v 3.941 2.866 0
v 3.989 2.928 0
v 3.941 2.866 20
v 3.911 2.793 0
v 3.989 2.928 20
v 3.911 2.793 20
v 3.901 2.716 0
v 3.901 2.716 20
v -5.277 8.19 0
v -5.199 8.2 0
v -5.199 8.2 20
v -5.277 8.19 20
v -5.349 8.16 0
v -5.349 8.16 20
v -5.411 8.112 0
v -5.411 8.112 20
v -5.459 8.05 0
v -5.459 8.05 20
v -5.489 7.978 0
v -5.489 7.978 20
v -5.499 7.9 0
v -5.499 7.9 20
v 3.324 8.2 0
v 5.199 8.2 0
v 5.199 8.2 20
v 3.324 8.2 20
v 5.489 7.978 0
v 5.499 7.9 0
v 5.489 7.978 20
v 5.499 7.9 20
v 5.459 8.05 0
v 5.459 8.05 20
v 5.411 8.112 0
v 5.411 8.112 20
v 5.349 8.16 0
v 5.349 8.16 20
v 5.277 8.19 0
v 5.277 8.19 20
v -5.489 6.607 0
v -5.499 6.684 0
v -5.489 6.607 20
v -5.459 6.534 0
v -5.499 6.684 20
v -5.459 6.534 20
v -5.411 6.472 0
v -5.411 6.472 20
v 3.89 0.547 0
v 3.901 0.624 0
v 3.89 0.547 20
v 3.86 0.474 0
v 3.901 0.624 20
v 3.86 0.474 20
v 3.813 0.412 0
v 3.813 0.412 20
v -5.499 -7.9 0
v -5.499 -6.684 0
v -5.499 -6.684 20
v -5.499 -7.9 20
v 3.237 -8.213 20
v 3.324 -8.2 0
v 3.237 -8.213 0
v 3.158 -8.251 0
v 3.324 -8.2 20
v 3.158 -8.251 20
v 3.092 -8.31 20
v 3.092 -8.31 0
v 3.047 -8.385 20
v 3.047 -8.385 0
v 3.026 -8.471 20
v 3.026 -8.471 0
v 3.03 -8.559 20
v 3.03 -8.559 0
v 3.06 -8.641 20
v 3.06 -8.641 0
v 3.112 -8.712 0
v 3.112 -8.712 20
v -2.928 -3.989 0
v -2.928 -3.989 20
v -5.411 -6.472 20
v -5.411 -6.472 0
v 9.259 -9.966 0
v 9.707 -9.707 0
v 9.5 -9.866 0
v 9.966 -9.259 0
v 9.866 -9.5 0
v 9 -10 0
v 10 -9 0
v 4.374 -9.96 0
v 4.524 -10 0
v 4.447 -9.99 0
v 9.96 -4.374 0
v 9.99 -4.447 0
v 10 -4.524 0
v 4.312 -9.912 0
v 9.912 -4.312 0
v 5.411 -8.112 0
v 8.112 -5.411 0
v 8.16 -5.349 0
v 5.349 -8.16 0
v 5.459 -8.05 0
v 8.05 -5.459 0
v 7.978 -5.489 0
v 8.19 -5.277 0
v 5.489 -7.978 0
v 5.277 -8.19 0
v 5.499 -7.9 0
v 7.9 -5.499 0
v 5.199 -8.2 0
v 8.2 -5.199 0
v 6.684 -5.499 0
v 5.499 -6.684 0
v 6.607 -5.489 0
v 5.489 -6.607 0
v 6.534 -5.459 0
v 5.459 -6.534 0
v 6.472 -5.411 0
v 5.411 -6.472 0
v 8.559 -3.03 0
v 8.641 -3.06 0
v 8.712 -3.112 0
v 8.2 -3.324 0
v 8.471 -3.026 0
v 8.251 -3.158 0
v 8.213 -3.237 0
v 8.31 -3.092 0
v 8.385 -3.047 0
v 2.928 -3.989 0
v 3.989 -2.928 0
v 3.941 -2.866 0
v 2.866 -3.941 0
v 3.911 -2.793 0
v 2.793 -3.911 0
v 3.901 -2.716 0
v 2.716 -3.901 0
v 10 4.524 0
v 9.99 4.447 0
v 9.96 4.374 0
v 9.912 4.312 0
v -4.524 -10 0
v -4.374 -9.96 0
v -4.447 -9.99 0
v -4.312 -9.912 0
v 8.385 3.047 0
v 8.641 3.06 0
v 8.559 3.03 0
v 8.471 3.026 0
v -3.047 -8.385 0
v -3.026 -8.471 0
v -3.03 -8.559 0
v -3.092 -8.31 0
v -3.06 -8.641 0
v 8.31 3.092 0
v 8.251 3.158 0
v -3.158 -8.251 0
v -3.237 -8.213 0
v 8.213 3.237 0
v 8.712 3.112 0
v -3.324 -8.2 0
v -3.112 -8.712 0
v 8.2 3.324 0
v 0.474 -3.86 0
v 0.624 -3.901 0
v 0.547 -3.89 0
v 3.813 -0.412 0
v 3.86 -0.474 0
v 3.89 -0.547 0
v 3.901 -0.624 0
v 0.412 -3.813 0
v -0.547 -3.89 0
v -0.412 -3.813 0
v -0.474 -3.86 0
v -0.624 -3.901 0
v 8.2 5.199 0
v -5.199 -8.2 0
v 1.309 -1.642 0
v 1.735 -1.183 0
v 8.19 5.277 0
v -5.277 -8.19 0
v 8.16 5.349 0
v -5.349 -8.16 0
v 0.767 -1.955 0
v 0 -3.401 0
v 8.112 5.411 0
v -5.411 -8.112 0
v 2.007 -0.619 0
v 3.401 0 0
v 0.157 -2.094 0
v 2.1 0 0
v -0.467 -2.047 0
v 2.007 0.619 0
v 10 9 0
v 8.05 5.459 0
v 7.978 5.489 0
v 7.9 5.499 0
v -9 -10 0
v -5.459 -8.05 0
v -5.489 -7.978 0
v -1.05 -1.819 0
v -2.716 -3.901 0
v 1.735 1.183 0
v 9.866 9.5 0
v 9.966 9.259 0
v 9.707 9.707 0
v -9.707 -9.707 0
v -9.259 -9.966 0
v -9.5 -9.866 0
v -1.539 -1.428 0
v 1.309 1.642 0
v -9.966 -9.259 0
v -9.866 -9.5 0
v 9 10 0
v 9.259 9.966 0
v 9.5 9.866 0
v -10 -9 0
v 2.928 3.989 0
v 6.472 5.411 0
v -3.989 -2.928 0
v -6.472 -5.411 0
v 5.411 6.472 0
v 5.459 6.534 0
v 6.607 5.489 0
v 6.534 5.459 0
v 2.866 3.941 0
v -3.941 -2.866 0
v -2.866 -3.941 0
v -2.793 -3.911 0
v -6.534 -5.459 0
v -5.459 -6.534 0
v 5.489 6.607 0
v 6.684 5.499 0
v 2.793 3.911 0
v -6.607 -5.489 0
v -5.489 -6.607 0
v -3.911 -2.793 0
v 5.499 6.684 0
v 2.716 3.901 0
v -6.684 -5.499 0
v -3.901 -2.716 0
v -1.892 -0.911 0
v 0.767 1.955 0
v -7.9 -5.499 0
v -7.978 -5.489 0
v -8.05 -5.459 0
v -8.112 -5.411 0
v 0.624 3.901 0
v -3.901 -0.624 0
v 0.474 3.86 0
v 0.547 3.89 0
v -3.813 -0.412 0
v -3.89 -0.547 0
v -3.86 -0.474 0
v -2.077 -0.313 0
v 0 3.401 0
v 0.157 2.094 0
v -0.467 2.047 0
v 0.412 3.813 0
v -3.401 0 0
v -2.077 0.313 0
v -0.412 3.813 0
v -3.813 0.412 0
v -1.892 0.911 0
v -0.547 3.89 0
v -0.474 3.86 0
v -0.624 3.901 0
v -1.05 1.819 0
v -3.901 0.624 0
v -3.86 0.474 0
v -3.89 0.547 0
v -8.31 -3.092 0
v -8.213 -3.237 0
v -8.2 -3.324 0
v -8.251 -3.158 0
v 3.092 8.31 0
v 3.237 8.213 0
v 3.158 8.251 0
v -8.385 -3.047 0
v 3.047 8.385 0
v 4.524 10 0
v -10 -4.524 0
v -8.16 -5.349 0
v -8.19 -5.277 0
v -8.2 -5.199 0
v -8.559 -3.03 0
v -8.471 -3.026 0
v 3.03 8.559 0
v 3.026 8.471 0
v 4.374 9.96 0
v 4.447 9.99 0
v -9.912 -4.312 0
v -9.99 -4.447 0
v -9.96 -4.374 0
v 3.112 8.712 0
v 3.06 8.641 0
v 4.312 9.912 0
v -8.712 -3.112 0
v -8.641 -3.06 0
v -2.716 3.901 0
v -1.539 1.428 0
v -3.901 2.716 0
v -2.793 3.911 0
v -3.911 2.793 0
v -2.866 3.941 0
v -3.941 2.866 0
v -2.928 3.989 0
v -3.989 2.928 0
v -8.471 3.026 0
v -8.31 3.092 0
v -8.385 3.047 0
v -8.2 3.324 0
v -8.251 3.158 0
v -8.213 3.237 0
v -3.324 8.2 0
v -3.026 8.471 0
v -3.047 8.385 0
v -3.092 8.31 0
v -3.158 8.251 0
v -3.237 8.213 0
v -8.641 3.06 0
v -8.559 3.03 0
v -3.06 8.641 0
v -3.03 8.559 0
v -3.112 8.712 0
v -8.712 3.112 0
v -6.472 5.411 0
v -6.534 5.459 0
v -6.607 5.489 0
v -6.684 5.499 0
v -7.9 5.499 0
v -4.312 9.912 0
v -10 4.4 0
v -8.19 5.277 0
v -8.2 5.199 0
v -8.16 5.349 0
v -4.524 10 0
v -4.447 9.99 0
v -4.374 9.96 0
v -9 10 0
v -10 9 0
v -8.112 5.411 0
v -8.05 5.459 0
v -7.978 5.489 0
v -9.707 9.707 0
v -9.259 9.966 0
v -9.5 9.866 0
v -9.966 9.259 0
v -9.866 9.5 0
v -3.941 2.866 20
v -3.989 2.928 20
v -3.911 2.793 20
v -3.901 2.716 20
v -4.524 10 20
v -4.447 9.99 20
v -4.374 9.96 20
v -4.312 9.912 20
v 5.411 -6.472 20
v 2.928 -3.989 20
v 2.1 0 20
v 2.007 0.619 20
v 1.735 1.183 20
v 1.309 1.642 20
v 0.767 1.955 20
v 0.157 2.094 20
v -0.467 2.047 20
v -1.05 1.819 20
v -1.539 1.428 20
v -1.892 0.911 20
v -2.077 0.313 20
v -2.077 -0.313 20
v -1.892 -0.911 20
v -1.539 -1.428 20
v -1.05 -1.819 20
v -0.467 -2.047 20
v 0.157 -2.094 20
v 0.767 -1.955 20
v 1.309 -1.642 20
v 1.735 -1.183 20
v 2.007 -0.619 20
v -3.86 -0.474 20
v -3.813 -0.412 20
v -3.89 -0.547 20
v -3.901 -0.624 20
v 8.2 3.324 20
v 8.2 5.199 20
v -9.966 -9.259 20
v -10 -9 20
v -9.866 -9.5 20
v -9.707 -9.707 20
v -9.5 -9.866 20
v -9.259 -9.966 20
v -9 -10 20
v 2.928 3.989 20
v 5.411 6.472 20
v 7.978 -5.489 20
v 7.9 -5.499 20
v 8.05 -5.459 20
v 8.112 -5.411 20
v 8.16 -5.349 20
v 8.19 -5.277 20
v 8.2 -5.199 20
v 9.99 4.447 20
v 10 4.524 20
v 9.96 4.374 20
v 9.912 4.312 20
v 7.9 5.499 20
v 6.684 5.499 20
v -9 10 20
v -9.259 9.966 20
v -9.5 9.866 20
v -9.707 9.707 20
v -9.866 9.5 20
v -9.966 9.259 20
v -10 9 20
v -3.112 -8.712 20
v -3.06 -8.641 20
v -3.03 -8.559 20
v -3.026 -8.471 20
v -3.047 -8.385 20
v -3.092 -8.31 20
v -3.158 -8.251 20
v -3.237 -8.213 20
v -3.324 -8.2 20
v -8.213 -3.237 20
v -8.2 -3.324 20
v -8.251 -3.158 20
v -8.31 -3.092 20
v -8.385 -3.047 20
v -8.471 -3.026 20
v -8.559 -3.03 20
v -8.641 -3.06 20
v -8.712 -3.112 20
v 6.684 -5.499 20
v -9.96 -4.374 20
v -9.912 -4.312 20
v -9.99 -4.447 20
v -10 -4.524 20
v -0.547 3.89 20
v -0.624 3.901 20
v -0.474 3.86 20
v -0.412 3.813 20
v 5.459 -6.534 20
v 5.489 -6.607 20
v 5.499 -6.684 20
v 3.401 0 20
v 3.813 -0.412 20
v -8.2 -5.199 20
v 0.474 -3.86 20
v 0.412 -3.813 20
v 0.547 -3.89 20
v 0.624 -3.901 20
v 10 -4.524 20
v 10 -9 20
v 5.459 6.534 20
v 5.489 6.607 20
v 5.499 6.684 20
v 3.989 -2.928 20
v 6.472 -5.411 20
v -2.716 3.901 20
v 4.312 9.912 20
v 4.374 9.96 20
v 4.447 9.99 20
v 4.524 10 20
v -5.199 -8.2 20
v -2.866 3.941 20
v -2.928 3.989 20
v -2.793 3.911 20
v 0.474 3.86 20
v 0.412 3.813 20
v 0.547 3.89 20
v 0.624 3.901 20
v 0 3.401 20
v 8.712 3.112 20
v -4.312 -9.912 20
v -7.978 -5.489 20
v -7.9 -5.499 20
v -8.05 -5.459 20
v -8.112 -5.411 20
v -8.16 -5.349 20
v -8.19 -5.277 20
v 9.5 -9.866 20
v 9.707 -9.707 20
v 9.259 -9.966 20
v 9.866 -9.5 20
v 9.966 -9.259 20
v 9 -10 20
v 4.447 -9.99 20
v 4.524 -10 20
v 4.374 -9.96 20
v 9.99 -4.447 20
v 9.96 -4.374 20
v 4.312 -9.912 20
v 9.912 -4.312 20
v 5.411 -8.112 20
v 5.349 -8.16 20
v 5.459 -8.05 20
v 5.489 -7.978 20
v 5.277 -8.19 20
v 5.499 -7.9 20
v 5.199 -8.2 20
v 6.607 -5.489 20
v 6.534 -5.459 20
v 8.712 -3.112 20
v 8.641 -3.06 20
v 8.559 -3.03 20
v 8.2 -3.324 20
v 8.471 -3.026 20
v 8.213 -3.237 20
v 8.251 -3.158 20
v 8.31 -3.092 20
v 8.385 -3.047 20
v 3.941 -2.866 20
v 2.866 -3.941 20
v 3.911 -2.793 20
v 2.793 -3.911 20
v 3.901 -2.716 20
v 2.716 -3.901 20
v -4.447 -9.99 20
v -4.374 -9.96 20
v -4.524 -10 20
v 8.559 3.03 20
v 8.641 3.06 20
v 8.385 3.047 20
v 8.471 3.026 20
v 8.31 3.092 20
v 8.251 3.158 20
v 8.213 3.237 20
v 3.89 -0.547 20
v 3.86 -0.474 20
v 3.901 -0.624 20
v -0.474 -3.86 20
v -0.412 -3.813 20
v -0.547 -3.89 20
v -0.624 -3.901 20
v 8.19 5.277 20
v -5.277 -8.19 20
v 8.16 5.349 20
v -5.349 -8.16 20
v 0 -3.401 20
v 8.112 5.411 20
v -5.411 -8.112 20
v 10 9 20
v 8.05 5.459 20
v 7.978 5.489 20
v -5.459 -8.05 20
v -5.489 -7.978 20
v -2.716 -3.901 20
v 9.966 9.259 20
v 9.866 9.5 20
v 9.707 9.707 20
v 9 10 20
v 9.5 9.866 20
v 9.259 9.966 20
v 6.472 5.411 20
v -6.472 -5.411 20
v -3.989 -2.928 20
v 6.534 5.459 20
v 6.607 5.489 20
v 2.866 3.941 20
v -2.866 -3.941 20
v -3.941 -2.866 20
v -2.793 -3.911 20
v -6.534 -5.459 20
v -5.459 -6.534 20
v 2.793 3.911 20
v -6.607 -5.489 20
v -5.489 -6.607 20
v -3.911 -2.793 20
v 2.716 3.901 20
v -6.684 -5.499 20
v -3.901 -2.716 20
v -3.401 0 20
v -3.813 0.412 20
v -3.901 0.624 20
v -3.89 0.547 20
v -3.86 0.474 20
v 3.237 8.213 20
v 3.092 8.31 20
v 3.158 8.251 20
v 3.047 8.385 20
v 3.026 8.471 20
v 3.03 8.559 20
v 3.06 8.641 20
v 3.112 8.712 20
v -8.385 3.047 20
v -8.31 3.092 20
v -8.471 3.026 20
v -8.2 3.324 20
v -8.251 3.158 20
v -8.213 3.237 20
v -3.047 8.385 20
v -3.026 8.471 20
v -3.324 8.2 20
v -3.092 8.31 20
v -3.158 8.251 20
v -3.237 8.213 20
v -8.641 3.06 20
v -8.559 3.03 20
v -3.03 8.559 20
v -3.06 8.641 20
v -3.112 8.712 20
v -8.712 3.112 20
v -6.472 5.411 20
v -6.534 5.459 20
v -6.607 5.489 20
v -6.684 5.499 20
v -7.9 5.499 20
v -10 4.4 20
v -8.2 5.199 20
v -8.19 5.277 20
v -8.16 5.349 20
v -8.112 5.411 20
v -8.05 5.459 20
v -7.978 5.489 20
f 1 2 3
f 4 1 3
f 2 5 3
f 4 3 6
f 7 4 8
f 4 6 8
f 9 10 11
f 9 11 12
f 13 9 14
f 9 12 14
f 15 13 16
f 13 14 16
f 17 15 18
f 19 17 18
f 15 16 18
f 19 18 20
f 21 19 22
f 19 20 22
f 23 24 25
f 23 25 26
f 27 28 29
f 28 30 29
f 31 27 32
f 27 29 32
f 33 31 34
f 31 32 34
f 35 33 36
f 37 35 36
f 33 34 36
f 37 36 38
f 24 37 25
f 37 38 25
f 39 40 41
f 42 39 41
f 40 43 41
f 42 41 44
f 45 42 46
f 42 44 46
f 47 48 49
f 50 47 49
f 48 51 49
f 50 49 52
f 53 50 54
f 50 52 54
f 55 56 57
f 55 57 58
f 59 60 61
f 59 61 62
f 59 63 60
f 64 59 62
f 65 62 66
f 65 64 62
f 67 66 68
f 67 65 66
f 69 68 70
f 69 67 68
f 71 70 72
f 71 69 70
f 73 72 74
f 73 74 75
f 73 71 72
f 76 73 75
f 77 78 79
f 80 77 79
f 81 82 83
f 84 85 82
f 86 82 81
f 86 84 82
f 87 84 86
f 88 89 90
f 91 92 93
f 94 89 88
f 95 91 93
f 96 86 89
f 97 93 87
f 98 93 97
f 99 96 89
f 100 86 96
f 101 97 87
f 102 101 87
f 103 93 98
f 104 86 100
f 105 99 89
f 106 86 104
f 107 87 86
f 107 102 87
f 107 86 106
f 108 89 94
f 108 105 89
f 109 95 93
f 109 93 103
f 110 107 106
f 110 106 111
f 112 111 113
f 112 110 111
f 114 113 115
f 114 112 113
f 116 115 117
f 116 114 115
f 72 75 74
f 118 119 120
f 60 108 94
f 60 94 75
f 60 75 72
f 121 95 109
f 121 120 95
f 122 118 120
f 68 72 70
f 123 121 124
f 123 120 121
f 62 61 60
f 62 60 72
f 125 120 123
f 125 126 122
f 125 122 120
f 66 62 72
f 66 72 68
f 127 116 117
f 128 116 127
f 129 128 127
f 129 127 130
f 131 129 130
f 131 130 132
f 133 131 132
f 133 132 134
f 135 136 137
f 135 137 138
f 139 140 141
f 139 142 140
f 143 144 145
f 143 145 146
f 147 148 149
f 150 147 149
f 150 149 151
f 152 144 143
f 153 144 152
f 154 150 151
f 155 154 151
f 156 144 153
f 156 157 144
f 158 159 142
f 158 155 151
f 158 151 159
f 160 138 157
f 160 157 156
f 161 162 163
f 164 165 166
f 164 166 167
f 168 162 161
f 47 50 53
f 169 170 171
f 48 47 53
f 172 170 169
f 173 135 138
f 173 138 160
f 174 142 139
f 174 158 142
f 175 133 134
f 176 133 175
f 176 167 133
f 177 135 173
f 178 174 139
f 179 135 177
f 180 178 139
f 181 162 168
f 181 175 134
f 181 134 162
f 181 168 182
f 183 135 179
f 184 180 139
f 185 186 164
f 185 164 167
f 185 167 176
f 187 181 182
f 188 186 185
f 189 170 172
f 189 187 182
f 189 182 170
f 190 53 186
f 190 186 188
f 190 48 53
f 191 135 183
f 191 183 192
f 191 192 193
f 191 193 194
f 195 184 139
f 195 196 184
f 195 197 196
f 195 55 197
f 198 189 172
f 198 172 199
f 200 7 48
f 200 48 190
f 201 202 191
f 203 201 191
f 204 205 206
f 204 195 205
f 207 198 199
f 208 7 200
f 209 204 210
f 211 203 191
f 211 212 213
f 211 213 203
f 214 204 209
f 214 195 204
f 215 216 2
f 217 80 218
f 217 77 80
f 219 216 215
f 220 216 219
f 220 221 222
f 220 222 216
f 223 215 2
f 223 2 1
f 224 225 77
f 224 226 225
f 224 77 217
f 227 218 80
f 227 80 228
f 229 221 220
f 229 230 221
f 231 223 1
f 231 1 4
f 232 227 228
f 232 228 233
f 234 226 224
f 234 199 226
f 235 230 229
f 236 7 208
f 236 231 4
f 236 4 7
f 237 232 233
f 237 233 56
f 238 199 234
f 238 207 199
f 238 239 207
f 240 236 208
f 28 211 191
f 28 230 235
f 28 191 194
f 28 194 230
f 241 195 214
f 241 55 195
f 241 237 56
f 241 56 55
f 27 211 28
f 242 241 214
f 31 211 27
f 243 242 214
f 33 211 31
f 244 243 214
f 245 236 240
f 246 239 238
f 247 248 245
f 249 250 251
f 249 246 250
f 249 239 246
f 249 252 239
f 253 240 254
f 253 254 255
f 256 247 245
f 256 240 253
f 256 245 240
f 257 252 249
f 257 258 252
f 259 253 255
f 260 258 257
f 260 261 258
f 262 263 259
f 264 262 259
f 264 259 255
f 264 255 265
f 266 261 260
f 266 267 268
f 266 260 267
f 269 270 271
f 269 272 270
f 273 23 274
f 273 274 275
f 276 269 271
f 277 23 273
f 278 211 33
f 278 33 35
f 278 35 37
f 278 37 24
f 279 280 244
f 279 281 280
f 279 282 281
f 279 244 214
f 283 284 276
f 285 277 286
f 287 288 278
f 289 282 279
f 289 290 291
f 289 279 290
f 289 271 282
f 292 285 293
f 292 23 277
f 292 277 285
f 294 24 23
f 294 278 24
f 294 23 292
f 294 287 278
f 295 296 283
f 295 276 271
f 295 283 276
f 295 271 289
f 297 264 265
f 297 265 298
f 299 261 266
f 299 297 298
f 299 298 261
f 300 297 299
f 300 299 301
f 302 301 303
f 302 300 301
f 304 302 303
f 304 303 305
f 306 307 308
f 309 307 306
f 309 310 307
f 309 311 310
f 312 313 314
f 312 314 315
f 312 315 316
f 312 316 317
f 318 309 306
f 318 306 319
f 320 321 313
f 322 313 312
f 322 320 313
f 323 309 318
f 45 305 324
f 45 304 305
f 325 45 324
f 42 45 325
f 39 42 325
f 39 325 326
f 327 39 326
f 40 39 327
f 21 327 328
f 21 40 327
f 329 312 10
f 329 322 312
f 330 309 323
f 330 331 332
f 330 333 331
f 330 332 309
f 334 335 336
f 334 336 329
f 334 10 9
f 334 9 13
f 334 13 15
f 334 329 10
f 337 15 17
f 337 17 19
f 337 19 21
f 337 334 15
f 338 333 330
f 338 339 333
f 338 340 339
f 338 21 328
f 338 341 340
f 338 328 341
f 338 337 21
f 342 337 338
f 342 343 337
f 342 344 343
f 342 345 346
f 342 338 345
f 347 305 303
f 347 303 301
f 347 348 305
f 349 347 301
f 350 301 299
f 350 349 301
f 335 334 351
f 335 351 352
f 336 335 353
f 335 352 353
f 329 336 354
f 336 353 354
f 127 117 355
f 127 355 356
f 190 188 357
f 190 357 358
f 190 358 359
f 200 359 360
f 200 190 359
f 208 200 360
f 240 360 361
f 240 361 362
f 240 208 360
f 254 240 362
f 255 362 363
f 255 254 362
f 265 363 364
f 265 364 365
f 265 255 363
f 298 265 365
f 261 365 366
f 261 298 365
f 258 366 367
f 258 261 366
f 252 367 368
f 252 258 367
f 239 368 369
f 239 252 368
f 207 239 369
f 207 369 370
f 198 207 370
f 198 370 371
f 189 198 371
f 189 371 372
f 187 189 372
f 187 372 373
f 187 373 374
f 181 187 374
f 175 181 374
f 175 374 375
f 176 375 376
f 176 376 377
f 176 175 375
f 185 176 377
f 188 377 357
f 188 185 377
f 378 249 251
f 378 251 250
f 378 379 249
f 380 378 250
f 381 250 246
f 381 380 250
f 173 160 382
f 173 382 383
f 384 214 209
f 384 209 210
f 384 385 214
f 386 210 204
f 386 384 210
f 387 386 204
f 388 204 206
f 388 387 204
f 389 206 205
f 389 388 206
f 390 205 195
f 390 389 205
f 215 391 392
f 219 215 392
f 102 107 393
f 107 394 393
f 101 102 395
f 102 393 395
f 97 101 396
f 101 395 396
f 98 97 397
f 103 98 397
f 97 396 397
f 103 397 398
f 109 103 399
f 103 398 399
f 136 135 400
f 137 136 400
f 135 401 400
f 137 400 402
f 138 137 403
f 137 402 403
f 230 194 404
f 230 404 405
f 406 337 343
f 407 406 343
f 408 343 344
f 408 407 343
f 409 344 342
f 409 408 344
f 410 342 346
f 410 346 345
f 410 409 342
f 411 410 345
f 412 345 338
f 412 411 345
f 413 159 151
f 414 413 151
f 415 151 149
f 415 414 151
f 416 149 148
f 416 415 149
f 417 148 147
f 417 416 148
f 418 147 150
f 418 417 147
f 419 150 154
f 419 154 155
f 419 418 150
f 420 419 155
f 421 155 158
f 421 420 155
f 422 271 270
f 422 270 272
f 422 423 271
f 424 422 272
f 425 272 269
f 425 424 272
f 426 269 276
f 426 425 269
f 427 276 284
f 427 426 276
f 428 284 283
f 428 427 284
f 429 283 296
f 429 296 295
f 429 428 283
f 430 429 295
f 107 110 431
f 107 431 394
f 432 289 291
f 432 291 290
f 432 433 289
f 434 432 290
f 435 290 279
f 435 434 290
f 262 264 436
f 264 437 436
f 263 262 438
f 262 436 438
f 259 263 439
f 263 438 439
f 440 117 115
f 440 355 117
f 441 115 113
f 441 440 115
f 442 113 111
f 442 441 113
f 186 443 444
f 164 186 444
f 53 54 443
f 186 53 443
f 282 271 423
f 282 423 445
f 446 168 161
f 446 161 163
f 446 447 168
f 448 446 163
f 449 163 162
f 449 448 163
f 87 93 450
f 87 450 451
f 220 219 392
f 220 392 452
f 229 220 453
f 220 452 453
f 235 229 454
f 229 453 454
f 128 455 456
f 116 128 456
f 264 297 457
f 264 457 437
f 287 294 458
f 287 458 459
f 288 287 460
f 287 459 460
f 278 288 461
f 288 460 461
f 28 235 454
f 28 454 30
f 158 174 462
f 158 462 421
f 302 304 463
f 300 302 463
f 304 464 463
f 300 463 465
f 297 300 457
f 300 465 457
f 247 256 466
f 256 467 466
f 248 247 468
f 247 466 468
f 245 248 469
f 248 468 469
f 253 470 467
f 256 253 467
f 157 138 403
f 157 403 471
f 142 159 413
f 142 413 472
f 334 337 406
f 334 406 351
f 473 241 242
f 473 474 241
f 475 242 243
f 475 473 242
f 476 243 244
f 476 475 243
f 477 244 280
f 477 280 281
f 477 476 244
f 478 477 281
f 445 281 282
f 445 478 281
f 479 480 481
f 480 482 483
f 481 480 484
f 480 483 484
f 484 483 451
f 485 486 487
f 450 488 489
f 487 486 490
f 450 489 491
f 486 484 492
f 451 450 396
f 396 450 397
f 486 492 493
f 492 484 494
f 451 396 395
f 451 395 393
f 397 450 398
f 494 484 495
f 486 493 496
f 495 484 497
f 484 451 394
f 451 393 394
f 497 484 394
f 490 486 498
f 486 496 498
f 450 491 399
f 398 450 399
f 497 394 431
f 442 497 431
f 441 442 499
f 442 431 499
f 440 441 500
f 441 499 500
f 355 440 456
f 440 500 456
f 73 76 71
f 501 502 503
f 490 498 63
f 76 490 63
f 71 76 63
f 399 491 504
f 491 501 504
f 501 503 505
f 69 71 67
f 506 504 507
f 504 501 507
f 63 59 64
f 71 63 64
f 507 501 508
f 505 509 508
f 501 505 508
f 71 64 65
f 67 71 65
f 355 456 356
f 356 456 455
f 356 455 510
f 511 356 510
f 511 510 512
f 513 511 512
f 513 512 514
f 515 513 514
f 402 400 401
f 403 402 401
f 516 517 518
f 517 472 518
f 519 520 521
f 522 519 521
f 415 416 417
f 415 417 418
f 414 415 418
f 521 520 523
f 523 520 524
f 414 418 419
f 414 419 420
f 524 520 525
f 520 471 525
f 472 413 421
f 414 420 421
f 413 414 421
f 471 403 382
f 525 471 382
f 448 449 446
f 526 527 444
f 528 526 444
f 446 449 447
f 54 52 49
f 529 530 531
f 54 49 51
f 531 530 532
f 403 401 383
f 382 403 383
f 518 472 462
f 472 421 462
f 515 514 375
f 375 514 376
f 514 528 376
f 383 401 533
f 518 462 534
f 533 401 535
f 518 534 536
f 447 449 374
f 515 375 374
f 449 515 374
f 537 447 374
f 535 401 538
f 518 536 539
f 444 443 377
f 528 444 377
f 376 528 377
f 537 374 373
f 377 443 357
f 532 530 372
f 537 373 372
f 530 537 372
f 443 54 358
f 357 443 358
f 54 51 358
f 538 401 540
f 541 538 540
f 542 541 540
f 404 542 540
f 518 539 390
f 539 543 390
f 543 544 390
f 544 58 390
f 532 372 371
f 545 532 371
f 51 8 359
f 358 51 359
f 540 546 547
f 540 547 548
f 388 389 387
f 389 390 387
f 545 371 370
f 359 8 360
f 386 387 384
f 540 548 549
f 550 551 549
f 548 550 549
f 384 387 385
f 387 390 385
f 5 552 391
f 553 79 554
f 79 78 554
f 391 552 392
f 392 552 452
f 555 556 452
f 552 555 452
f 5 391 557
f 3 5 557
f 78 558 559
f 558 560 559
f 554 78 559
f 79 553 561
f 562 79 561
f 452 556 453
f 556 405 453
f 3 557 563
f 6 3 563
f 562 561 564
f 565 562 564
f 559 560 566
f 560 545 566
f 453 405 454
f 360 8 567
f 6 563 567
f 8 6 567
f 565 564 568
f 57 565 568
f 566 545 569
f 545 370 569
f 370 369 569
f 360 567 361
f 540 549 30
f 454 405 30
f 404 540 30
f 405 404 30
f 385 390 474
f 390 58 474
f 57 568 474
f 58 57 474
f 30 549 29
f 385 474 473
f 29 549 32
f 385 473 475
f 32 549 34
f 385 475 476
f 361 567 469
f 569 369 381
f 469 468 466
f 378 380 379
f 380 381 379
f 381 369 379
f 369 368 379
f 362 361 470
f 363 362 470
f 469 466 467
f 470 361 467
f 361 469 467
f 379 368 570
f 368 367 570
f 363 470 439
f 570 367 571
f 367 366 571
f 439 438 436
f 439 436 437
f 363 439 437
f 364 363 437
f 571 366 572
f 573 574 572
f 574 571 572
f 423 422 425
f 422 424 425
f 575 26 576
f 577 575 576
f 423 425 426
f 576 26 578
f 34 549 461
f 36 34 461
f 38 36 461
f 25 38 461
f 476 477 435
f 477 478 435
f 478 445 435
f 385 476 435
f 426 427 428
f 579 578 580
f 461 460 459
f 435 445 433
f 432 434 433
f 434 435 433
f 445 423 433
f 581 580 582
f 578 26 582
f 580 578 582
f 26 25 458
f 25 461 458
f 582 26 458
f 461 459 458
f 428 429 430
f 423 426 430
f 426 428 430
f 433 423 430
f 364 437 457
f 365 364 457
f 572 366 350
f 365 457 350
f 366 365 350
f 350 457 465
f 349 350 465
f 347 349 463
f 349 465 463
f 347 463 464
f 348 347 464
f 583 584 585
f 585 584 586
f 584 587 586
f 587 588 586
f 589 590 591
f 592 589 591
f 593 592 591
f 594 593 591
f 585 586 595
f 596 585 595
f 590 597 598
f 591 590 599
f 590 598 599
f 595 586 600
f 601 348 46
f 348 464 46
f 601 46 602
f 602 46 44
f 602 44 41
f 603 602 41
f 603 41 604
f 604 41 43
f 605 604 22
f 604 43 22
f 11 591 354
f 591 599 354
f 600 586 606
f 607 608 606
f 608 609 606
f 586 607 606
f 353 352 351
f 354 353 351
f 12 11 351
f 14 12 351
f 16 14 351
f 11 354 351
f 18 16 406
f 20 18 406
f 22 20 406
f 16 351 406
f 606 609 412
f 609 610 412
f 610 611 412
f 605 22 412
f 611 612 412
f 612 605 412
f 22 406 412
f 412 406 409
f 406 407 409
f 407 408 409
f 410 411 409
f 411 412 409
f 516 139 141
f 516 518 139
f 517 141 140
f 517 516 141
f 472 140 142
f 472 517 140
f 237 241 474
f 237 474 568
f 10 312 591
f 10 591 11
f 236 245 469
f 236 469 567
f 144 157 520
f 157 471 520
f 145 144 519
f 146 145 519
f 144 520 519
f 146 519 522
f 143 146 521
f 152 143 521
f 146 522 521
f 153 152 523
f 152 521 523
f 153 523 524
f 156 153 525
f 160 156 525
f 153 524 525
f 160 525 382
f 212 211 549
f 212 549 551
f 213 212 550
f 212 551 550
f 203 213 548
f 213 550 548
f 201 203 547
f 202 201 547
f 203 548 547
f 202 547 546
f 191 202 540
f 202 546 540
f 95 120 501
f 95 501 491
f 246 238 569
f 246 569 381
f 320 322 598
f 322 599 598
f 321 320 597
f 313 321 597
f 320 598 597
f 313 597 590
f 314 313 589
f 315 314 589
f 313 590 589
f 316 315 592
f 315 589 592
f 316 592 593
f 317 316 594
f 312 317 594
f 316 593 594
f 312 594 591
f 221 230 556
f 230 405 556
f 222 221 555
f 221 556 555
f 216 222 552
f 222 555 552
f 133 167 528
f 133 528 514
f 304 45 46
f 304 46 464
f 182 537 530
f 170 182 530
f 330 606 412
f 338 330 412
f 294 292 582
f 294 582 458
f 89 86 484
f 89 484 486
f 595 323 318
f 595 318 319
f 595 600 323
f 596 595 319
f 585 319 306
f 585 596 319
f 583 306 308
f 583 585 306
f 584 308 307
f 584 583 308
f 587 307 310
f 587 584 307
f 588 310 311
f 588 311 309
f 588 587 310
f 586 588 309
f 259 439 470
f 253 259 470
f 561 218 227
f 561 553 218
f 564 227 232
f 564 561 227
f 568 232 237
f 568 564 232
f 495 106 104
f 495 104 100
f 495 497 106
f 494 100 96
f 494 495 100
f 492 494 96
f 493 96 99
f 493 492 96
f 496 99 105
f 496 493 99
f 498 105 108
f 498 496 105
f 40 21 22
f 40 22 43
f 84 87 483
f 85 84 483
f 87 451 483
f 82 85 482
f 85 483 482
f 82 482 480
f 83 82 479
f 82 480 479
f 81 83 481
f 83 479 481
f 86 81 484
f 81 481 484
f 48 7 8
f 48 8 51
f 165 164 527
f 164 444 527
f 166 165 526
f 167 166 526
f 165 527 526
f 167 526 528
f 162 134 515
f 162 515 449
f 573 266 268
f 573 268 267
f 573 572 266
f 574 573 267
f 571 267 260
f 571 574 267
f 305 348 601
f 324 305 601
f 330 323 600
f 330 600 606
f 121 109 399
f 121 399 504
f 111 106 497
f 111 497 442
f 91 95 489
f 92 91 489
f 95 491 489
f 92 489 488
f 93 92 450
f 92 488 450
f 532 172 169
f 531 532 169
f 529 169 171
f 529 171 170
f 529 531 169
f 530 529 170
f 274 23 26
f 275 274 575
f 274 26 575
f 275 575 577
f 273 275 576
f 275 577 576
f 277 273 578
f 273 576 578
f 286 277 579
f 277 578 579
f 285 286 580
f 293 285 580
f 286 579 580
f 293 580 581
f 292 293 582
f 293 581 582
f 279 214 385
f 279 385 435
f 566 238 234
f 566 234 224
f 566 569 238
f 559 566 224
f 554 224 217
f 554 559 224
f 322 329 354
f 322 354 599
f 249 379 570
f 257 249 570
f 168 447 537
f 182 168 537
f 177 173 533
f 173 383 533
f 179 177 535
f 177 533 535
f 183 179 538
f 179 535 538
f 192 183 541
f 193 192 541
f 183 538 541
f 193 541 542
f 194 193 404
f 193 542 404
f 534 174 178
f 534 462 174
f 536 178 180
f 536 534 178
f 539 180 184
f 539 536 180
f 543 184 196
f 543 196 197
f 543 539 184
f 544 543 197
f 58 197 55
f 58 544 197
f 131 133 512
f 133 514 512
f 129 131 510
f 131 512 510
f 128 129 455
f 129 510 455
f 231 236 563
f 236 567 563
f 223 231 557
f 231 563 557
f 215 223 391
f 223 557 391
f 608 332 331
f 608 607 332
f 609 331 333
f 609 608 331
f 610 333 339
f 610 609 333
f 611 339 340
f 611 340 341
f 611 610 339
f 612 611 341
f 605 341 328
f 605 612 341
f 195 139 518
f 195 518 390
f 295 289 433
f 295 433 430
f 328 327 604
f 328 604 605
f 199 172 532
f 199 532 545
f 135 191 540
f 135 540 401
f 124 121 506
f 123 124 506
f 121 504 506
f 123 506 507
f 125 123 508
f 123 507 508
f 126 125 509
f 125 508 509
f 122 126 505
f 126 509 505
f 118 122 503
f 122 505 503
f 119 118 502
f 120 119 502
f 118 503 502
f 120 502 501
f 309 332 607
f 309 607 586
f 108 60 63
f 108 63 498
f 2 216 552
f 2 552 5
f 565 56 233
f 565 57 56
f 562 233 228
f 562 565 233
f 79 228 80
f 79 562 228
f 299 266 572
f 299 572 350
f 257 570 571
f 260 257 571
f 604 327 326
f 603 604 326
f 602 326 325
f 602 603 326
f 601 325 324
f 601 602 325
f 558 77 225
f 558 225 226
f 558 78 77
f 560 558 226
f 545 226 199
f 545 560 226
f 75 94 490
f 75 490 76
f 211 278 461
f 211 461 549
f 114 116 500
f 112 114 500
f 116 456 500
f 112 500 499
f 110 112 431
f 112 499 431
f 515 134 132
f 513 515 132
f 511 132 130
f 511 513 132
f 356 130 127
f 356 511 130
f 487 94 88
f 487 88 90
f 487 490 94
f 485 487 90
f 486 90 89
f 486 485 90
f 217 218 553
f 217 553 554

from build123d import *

# Parameters (mm, degrees)
SKETCH_1_R      = 2.1
EXTRUDE_1_DEPTH = 20
FILLET_1_R      = 1
FILLET_2_R      = 0.3


with BuildPart() as part:
    # Эскиз1 → Бобышка-Вытянуть1 (new body)
    with BuildSketch(Plane.XY):
        Polygon((-10, 10), (-4.4, 10), (-2.6, 8.2), (-5.499339828, 8.2), (-5.499339828, 6.56), (-2.84, 3.900660172), (-0.5, 3.900660172), (0, 3.400660172), (0.5, 3.900660172), (2.84, 3.900660172), (5.499339828, 6.56), (5.499339828, 8.2), (2.6, 8.2), (4.4, 10), (10, 10), (10, 4.4), (8.2, 2.6), (8.2, 5.499339828), (6.56, 5.499339828), (3.900660172, 2.84), (3.900660172, 0.5), (3.400660172, 0), (3.900660172, -0.5), (3.900660172, -2.84), (6.56, -5.499339828), (8.2, -5.499339828), (8.2, -2.6), (10, -4.4), (10, -10), (4.4, -10), (2.6, -8.2), (5.499339828, -8.2), (5.499339828, -6.56), (2.84, -3.900660172), (0.5, -3.900660172), (0, -3.400660172), (-0.5, -3.900660172), (-2.84, -3.900660172), (-5.499339828, -6.56), (-5.499339828, -8.2), (-2.6, -8.2), (-4.4, -10), (-10, -10), (-10, -4.4), (-8.2, -2.6), (-8.2, -5.499339828), (-6.56, -5.499339828), (-3.900660172, -2.84), (-3.900660172, -0.5), (-3.400660172, 0), (-3.900660172, 0.5), (-3.900660172, 2.84), (-6.56, 5.499339828), (-8.2, 5.499339828), (-8.2, 2.6), (-10, 4.4), align=None)
        Circle(SKETCH_1_R, mode=Mode.SUBTRACT)
    extrude(amount=EXTRUDE_1_DEPTH)

    # Скругление1
    fillet_1_edges = [part.edges().sort_by_distance(p)[0] for p in [
        (-10, 10, 10),
        (10, 10, 10),
        (10, -10, 10),
        (-10, -10, 10),
    ]]
    fillet(fillet_1_edges, radius=FILLET_1_R)

    # Скругление2
    fillet_2_edges = [part.edges().sort_by_distance(p)[0] for p in [
        (-4.4, 10, 10),
        (-2.6, 8.2, 10),
        (-5.499339828, 8.2, 10),
        (-5.499339828, 6.56, 10),
        (-2.84, 3.900660172, 10),
        (-0.5, 3.900660172, 10),
        (0.5, 3.900660172, 10),
        (2.84, 3.900660172, 10),
        (5.499339828, 6.56, 10),
        (5.499339828, 8.2, 10),
        (2.6, 8.2, 10),
        (4.4, 10, 10),
        (10, 4.4, 10),
        (8.2, 2.6, 10),
        (8.2, 5.499339828, 10),
        (6.56, 5.499339828, 10),
        (3.900660172, 2.84, 10),
        (3.900660172, 0.5, 10),
        (3.900660172, -0.5, 10),
        (3.900660172, -2.84, 10),
        (6.56, -5.499339828, 10),
        (8.2, -5.499339828, 10),
        (8.2, -2.6, 10),
        (10, -4.4, 10),
        (4.4, -10, 10),
        (2.6, -8.2, 10),
        (5.499339828, -8.2, 10),
        (5.499339828, -6.56, 10),
        (2.84, -3.900660172, 10),
        (0.5, -3.900660172, 10),
        (-0.5, -3.900660172, 10),
        (-2.84, -3.900660172, 10),
        (-5.499339828, -6.56, 10),
        (-5.499339828, -8.2, 10),
        (-2.6, -8.2, 10),
        (-4.4, -10, 10),
        (-10, -4.4, 10),
        (-8.2, -2.6, 10),
        (-8.2, -5.499339828, 10),
        (-6.56, -5.499339828, 10),
        (-3.900660172, -2.84, 10),
        (-3.900660172, -0.5, 10),
        (-3.900660172, 0.5, 10),
        (-3.900660172, 2.84, 10),
        (-6.56, 5.499339828, 10),
        (-8.2, 5.499339828, 10),
        (-8.2, 2.6, 10),
    ]]
    fillet(fillet_2_edges, radius=FILLET_2_R)


solid = part.part
